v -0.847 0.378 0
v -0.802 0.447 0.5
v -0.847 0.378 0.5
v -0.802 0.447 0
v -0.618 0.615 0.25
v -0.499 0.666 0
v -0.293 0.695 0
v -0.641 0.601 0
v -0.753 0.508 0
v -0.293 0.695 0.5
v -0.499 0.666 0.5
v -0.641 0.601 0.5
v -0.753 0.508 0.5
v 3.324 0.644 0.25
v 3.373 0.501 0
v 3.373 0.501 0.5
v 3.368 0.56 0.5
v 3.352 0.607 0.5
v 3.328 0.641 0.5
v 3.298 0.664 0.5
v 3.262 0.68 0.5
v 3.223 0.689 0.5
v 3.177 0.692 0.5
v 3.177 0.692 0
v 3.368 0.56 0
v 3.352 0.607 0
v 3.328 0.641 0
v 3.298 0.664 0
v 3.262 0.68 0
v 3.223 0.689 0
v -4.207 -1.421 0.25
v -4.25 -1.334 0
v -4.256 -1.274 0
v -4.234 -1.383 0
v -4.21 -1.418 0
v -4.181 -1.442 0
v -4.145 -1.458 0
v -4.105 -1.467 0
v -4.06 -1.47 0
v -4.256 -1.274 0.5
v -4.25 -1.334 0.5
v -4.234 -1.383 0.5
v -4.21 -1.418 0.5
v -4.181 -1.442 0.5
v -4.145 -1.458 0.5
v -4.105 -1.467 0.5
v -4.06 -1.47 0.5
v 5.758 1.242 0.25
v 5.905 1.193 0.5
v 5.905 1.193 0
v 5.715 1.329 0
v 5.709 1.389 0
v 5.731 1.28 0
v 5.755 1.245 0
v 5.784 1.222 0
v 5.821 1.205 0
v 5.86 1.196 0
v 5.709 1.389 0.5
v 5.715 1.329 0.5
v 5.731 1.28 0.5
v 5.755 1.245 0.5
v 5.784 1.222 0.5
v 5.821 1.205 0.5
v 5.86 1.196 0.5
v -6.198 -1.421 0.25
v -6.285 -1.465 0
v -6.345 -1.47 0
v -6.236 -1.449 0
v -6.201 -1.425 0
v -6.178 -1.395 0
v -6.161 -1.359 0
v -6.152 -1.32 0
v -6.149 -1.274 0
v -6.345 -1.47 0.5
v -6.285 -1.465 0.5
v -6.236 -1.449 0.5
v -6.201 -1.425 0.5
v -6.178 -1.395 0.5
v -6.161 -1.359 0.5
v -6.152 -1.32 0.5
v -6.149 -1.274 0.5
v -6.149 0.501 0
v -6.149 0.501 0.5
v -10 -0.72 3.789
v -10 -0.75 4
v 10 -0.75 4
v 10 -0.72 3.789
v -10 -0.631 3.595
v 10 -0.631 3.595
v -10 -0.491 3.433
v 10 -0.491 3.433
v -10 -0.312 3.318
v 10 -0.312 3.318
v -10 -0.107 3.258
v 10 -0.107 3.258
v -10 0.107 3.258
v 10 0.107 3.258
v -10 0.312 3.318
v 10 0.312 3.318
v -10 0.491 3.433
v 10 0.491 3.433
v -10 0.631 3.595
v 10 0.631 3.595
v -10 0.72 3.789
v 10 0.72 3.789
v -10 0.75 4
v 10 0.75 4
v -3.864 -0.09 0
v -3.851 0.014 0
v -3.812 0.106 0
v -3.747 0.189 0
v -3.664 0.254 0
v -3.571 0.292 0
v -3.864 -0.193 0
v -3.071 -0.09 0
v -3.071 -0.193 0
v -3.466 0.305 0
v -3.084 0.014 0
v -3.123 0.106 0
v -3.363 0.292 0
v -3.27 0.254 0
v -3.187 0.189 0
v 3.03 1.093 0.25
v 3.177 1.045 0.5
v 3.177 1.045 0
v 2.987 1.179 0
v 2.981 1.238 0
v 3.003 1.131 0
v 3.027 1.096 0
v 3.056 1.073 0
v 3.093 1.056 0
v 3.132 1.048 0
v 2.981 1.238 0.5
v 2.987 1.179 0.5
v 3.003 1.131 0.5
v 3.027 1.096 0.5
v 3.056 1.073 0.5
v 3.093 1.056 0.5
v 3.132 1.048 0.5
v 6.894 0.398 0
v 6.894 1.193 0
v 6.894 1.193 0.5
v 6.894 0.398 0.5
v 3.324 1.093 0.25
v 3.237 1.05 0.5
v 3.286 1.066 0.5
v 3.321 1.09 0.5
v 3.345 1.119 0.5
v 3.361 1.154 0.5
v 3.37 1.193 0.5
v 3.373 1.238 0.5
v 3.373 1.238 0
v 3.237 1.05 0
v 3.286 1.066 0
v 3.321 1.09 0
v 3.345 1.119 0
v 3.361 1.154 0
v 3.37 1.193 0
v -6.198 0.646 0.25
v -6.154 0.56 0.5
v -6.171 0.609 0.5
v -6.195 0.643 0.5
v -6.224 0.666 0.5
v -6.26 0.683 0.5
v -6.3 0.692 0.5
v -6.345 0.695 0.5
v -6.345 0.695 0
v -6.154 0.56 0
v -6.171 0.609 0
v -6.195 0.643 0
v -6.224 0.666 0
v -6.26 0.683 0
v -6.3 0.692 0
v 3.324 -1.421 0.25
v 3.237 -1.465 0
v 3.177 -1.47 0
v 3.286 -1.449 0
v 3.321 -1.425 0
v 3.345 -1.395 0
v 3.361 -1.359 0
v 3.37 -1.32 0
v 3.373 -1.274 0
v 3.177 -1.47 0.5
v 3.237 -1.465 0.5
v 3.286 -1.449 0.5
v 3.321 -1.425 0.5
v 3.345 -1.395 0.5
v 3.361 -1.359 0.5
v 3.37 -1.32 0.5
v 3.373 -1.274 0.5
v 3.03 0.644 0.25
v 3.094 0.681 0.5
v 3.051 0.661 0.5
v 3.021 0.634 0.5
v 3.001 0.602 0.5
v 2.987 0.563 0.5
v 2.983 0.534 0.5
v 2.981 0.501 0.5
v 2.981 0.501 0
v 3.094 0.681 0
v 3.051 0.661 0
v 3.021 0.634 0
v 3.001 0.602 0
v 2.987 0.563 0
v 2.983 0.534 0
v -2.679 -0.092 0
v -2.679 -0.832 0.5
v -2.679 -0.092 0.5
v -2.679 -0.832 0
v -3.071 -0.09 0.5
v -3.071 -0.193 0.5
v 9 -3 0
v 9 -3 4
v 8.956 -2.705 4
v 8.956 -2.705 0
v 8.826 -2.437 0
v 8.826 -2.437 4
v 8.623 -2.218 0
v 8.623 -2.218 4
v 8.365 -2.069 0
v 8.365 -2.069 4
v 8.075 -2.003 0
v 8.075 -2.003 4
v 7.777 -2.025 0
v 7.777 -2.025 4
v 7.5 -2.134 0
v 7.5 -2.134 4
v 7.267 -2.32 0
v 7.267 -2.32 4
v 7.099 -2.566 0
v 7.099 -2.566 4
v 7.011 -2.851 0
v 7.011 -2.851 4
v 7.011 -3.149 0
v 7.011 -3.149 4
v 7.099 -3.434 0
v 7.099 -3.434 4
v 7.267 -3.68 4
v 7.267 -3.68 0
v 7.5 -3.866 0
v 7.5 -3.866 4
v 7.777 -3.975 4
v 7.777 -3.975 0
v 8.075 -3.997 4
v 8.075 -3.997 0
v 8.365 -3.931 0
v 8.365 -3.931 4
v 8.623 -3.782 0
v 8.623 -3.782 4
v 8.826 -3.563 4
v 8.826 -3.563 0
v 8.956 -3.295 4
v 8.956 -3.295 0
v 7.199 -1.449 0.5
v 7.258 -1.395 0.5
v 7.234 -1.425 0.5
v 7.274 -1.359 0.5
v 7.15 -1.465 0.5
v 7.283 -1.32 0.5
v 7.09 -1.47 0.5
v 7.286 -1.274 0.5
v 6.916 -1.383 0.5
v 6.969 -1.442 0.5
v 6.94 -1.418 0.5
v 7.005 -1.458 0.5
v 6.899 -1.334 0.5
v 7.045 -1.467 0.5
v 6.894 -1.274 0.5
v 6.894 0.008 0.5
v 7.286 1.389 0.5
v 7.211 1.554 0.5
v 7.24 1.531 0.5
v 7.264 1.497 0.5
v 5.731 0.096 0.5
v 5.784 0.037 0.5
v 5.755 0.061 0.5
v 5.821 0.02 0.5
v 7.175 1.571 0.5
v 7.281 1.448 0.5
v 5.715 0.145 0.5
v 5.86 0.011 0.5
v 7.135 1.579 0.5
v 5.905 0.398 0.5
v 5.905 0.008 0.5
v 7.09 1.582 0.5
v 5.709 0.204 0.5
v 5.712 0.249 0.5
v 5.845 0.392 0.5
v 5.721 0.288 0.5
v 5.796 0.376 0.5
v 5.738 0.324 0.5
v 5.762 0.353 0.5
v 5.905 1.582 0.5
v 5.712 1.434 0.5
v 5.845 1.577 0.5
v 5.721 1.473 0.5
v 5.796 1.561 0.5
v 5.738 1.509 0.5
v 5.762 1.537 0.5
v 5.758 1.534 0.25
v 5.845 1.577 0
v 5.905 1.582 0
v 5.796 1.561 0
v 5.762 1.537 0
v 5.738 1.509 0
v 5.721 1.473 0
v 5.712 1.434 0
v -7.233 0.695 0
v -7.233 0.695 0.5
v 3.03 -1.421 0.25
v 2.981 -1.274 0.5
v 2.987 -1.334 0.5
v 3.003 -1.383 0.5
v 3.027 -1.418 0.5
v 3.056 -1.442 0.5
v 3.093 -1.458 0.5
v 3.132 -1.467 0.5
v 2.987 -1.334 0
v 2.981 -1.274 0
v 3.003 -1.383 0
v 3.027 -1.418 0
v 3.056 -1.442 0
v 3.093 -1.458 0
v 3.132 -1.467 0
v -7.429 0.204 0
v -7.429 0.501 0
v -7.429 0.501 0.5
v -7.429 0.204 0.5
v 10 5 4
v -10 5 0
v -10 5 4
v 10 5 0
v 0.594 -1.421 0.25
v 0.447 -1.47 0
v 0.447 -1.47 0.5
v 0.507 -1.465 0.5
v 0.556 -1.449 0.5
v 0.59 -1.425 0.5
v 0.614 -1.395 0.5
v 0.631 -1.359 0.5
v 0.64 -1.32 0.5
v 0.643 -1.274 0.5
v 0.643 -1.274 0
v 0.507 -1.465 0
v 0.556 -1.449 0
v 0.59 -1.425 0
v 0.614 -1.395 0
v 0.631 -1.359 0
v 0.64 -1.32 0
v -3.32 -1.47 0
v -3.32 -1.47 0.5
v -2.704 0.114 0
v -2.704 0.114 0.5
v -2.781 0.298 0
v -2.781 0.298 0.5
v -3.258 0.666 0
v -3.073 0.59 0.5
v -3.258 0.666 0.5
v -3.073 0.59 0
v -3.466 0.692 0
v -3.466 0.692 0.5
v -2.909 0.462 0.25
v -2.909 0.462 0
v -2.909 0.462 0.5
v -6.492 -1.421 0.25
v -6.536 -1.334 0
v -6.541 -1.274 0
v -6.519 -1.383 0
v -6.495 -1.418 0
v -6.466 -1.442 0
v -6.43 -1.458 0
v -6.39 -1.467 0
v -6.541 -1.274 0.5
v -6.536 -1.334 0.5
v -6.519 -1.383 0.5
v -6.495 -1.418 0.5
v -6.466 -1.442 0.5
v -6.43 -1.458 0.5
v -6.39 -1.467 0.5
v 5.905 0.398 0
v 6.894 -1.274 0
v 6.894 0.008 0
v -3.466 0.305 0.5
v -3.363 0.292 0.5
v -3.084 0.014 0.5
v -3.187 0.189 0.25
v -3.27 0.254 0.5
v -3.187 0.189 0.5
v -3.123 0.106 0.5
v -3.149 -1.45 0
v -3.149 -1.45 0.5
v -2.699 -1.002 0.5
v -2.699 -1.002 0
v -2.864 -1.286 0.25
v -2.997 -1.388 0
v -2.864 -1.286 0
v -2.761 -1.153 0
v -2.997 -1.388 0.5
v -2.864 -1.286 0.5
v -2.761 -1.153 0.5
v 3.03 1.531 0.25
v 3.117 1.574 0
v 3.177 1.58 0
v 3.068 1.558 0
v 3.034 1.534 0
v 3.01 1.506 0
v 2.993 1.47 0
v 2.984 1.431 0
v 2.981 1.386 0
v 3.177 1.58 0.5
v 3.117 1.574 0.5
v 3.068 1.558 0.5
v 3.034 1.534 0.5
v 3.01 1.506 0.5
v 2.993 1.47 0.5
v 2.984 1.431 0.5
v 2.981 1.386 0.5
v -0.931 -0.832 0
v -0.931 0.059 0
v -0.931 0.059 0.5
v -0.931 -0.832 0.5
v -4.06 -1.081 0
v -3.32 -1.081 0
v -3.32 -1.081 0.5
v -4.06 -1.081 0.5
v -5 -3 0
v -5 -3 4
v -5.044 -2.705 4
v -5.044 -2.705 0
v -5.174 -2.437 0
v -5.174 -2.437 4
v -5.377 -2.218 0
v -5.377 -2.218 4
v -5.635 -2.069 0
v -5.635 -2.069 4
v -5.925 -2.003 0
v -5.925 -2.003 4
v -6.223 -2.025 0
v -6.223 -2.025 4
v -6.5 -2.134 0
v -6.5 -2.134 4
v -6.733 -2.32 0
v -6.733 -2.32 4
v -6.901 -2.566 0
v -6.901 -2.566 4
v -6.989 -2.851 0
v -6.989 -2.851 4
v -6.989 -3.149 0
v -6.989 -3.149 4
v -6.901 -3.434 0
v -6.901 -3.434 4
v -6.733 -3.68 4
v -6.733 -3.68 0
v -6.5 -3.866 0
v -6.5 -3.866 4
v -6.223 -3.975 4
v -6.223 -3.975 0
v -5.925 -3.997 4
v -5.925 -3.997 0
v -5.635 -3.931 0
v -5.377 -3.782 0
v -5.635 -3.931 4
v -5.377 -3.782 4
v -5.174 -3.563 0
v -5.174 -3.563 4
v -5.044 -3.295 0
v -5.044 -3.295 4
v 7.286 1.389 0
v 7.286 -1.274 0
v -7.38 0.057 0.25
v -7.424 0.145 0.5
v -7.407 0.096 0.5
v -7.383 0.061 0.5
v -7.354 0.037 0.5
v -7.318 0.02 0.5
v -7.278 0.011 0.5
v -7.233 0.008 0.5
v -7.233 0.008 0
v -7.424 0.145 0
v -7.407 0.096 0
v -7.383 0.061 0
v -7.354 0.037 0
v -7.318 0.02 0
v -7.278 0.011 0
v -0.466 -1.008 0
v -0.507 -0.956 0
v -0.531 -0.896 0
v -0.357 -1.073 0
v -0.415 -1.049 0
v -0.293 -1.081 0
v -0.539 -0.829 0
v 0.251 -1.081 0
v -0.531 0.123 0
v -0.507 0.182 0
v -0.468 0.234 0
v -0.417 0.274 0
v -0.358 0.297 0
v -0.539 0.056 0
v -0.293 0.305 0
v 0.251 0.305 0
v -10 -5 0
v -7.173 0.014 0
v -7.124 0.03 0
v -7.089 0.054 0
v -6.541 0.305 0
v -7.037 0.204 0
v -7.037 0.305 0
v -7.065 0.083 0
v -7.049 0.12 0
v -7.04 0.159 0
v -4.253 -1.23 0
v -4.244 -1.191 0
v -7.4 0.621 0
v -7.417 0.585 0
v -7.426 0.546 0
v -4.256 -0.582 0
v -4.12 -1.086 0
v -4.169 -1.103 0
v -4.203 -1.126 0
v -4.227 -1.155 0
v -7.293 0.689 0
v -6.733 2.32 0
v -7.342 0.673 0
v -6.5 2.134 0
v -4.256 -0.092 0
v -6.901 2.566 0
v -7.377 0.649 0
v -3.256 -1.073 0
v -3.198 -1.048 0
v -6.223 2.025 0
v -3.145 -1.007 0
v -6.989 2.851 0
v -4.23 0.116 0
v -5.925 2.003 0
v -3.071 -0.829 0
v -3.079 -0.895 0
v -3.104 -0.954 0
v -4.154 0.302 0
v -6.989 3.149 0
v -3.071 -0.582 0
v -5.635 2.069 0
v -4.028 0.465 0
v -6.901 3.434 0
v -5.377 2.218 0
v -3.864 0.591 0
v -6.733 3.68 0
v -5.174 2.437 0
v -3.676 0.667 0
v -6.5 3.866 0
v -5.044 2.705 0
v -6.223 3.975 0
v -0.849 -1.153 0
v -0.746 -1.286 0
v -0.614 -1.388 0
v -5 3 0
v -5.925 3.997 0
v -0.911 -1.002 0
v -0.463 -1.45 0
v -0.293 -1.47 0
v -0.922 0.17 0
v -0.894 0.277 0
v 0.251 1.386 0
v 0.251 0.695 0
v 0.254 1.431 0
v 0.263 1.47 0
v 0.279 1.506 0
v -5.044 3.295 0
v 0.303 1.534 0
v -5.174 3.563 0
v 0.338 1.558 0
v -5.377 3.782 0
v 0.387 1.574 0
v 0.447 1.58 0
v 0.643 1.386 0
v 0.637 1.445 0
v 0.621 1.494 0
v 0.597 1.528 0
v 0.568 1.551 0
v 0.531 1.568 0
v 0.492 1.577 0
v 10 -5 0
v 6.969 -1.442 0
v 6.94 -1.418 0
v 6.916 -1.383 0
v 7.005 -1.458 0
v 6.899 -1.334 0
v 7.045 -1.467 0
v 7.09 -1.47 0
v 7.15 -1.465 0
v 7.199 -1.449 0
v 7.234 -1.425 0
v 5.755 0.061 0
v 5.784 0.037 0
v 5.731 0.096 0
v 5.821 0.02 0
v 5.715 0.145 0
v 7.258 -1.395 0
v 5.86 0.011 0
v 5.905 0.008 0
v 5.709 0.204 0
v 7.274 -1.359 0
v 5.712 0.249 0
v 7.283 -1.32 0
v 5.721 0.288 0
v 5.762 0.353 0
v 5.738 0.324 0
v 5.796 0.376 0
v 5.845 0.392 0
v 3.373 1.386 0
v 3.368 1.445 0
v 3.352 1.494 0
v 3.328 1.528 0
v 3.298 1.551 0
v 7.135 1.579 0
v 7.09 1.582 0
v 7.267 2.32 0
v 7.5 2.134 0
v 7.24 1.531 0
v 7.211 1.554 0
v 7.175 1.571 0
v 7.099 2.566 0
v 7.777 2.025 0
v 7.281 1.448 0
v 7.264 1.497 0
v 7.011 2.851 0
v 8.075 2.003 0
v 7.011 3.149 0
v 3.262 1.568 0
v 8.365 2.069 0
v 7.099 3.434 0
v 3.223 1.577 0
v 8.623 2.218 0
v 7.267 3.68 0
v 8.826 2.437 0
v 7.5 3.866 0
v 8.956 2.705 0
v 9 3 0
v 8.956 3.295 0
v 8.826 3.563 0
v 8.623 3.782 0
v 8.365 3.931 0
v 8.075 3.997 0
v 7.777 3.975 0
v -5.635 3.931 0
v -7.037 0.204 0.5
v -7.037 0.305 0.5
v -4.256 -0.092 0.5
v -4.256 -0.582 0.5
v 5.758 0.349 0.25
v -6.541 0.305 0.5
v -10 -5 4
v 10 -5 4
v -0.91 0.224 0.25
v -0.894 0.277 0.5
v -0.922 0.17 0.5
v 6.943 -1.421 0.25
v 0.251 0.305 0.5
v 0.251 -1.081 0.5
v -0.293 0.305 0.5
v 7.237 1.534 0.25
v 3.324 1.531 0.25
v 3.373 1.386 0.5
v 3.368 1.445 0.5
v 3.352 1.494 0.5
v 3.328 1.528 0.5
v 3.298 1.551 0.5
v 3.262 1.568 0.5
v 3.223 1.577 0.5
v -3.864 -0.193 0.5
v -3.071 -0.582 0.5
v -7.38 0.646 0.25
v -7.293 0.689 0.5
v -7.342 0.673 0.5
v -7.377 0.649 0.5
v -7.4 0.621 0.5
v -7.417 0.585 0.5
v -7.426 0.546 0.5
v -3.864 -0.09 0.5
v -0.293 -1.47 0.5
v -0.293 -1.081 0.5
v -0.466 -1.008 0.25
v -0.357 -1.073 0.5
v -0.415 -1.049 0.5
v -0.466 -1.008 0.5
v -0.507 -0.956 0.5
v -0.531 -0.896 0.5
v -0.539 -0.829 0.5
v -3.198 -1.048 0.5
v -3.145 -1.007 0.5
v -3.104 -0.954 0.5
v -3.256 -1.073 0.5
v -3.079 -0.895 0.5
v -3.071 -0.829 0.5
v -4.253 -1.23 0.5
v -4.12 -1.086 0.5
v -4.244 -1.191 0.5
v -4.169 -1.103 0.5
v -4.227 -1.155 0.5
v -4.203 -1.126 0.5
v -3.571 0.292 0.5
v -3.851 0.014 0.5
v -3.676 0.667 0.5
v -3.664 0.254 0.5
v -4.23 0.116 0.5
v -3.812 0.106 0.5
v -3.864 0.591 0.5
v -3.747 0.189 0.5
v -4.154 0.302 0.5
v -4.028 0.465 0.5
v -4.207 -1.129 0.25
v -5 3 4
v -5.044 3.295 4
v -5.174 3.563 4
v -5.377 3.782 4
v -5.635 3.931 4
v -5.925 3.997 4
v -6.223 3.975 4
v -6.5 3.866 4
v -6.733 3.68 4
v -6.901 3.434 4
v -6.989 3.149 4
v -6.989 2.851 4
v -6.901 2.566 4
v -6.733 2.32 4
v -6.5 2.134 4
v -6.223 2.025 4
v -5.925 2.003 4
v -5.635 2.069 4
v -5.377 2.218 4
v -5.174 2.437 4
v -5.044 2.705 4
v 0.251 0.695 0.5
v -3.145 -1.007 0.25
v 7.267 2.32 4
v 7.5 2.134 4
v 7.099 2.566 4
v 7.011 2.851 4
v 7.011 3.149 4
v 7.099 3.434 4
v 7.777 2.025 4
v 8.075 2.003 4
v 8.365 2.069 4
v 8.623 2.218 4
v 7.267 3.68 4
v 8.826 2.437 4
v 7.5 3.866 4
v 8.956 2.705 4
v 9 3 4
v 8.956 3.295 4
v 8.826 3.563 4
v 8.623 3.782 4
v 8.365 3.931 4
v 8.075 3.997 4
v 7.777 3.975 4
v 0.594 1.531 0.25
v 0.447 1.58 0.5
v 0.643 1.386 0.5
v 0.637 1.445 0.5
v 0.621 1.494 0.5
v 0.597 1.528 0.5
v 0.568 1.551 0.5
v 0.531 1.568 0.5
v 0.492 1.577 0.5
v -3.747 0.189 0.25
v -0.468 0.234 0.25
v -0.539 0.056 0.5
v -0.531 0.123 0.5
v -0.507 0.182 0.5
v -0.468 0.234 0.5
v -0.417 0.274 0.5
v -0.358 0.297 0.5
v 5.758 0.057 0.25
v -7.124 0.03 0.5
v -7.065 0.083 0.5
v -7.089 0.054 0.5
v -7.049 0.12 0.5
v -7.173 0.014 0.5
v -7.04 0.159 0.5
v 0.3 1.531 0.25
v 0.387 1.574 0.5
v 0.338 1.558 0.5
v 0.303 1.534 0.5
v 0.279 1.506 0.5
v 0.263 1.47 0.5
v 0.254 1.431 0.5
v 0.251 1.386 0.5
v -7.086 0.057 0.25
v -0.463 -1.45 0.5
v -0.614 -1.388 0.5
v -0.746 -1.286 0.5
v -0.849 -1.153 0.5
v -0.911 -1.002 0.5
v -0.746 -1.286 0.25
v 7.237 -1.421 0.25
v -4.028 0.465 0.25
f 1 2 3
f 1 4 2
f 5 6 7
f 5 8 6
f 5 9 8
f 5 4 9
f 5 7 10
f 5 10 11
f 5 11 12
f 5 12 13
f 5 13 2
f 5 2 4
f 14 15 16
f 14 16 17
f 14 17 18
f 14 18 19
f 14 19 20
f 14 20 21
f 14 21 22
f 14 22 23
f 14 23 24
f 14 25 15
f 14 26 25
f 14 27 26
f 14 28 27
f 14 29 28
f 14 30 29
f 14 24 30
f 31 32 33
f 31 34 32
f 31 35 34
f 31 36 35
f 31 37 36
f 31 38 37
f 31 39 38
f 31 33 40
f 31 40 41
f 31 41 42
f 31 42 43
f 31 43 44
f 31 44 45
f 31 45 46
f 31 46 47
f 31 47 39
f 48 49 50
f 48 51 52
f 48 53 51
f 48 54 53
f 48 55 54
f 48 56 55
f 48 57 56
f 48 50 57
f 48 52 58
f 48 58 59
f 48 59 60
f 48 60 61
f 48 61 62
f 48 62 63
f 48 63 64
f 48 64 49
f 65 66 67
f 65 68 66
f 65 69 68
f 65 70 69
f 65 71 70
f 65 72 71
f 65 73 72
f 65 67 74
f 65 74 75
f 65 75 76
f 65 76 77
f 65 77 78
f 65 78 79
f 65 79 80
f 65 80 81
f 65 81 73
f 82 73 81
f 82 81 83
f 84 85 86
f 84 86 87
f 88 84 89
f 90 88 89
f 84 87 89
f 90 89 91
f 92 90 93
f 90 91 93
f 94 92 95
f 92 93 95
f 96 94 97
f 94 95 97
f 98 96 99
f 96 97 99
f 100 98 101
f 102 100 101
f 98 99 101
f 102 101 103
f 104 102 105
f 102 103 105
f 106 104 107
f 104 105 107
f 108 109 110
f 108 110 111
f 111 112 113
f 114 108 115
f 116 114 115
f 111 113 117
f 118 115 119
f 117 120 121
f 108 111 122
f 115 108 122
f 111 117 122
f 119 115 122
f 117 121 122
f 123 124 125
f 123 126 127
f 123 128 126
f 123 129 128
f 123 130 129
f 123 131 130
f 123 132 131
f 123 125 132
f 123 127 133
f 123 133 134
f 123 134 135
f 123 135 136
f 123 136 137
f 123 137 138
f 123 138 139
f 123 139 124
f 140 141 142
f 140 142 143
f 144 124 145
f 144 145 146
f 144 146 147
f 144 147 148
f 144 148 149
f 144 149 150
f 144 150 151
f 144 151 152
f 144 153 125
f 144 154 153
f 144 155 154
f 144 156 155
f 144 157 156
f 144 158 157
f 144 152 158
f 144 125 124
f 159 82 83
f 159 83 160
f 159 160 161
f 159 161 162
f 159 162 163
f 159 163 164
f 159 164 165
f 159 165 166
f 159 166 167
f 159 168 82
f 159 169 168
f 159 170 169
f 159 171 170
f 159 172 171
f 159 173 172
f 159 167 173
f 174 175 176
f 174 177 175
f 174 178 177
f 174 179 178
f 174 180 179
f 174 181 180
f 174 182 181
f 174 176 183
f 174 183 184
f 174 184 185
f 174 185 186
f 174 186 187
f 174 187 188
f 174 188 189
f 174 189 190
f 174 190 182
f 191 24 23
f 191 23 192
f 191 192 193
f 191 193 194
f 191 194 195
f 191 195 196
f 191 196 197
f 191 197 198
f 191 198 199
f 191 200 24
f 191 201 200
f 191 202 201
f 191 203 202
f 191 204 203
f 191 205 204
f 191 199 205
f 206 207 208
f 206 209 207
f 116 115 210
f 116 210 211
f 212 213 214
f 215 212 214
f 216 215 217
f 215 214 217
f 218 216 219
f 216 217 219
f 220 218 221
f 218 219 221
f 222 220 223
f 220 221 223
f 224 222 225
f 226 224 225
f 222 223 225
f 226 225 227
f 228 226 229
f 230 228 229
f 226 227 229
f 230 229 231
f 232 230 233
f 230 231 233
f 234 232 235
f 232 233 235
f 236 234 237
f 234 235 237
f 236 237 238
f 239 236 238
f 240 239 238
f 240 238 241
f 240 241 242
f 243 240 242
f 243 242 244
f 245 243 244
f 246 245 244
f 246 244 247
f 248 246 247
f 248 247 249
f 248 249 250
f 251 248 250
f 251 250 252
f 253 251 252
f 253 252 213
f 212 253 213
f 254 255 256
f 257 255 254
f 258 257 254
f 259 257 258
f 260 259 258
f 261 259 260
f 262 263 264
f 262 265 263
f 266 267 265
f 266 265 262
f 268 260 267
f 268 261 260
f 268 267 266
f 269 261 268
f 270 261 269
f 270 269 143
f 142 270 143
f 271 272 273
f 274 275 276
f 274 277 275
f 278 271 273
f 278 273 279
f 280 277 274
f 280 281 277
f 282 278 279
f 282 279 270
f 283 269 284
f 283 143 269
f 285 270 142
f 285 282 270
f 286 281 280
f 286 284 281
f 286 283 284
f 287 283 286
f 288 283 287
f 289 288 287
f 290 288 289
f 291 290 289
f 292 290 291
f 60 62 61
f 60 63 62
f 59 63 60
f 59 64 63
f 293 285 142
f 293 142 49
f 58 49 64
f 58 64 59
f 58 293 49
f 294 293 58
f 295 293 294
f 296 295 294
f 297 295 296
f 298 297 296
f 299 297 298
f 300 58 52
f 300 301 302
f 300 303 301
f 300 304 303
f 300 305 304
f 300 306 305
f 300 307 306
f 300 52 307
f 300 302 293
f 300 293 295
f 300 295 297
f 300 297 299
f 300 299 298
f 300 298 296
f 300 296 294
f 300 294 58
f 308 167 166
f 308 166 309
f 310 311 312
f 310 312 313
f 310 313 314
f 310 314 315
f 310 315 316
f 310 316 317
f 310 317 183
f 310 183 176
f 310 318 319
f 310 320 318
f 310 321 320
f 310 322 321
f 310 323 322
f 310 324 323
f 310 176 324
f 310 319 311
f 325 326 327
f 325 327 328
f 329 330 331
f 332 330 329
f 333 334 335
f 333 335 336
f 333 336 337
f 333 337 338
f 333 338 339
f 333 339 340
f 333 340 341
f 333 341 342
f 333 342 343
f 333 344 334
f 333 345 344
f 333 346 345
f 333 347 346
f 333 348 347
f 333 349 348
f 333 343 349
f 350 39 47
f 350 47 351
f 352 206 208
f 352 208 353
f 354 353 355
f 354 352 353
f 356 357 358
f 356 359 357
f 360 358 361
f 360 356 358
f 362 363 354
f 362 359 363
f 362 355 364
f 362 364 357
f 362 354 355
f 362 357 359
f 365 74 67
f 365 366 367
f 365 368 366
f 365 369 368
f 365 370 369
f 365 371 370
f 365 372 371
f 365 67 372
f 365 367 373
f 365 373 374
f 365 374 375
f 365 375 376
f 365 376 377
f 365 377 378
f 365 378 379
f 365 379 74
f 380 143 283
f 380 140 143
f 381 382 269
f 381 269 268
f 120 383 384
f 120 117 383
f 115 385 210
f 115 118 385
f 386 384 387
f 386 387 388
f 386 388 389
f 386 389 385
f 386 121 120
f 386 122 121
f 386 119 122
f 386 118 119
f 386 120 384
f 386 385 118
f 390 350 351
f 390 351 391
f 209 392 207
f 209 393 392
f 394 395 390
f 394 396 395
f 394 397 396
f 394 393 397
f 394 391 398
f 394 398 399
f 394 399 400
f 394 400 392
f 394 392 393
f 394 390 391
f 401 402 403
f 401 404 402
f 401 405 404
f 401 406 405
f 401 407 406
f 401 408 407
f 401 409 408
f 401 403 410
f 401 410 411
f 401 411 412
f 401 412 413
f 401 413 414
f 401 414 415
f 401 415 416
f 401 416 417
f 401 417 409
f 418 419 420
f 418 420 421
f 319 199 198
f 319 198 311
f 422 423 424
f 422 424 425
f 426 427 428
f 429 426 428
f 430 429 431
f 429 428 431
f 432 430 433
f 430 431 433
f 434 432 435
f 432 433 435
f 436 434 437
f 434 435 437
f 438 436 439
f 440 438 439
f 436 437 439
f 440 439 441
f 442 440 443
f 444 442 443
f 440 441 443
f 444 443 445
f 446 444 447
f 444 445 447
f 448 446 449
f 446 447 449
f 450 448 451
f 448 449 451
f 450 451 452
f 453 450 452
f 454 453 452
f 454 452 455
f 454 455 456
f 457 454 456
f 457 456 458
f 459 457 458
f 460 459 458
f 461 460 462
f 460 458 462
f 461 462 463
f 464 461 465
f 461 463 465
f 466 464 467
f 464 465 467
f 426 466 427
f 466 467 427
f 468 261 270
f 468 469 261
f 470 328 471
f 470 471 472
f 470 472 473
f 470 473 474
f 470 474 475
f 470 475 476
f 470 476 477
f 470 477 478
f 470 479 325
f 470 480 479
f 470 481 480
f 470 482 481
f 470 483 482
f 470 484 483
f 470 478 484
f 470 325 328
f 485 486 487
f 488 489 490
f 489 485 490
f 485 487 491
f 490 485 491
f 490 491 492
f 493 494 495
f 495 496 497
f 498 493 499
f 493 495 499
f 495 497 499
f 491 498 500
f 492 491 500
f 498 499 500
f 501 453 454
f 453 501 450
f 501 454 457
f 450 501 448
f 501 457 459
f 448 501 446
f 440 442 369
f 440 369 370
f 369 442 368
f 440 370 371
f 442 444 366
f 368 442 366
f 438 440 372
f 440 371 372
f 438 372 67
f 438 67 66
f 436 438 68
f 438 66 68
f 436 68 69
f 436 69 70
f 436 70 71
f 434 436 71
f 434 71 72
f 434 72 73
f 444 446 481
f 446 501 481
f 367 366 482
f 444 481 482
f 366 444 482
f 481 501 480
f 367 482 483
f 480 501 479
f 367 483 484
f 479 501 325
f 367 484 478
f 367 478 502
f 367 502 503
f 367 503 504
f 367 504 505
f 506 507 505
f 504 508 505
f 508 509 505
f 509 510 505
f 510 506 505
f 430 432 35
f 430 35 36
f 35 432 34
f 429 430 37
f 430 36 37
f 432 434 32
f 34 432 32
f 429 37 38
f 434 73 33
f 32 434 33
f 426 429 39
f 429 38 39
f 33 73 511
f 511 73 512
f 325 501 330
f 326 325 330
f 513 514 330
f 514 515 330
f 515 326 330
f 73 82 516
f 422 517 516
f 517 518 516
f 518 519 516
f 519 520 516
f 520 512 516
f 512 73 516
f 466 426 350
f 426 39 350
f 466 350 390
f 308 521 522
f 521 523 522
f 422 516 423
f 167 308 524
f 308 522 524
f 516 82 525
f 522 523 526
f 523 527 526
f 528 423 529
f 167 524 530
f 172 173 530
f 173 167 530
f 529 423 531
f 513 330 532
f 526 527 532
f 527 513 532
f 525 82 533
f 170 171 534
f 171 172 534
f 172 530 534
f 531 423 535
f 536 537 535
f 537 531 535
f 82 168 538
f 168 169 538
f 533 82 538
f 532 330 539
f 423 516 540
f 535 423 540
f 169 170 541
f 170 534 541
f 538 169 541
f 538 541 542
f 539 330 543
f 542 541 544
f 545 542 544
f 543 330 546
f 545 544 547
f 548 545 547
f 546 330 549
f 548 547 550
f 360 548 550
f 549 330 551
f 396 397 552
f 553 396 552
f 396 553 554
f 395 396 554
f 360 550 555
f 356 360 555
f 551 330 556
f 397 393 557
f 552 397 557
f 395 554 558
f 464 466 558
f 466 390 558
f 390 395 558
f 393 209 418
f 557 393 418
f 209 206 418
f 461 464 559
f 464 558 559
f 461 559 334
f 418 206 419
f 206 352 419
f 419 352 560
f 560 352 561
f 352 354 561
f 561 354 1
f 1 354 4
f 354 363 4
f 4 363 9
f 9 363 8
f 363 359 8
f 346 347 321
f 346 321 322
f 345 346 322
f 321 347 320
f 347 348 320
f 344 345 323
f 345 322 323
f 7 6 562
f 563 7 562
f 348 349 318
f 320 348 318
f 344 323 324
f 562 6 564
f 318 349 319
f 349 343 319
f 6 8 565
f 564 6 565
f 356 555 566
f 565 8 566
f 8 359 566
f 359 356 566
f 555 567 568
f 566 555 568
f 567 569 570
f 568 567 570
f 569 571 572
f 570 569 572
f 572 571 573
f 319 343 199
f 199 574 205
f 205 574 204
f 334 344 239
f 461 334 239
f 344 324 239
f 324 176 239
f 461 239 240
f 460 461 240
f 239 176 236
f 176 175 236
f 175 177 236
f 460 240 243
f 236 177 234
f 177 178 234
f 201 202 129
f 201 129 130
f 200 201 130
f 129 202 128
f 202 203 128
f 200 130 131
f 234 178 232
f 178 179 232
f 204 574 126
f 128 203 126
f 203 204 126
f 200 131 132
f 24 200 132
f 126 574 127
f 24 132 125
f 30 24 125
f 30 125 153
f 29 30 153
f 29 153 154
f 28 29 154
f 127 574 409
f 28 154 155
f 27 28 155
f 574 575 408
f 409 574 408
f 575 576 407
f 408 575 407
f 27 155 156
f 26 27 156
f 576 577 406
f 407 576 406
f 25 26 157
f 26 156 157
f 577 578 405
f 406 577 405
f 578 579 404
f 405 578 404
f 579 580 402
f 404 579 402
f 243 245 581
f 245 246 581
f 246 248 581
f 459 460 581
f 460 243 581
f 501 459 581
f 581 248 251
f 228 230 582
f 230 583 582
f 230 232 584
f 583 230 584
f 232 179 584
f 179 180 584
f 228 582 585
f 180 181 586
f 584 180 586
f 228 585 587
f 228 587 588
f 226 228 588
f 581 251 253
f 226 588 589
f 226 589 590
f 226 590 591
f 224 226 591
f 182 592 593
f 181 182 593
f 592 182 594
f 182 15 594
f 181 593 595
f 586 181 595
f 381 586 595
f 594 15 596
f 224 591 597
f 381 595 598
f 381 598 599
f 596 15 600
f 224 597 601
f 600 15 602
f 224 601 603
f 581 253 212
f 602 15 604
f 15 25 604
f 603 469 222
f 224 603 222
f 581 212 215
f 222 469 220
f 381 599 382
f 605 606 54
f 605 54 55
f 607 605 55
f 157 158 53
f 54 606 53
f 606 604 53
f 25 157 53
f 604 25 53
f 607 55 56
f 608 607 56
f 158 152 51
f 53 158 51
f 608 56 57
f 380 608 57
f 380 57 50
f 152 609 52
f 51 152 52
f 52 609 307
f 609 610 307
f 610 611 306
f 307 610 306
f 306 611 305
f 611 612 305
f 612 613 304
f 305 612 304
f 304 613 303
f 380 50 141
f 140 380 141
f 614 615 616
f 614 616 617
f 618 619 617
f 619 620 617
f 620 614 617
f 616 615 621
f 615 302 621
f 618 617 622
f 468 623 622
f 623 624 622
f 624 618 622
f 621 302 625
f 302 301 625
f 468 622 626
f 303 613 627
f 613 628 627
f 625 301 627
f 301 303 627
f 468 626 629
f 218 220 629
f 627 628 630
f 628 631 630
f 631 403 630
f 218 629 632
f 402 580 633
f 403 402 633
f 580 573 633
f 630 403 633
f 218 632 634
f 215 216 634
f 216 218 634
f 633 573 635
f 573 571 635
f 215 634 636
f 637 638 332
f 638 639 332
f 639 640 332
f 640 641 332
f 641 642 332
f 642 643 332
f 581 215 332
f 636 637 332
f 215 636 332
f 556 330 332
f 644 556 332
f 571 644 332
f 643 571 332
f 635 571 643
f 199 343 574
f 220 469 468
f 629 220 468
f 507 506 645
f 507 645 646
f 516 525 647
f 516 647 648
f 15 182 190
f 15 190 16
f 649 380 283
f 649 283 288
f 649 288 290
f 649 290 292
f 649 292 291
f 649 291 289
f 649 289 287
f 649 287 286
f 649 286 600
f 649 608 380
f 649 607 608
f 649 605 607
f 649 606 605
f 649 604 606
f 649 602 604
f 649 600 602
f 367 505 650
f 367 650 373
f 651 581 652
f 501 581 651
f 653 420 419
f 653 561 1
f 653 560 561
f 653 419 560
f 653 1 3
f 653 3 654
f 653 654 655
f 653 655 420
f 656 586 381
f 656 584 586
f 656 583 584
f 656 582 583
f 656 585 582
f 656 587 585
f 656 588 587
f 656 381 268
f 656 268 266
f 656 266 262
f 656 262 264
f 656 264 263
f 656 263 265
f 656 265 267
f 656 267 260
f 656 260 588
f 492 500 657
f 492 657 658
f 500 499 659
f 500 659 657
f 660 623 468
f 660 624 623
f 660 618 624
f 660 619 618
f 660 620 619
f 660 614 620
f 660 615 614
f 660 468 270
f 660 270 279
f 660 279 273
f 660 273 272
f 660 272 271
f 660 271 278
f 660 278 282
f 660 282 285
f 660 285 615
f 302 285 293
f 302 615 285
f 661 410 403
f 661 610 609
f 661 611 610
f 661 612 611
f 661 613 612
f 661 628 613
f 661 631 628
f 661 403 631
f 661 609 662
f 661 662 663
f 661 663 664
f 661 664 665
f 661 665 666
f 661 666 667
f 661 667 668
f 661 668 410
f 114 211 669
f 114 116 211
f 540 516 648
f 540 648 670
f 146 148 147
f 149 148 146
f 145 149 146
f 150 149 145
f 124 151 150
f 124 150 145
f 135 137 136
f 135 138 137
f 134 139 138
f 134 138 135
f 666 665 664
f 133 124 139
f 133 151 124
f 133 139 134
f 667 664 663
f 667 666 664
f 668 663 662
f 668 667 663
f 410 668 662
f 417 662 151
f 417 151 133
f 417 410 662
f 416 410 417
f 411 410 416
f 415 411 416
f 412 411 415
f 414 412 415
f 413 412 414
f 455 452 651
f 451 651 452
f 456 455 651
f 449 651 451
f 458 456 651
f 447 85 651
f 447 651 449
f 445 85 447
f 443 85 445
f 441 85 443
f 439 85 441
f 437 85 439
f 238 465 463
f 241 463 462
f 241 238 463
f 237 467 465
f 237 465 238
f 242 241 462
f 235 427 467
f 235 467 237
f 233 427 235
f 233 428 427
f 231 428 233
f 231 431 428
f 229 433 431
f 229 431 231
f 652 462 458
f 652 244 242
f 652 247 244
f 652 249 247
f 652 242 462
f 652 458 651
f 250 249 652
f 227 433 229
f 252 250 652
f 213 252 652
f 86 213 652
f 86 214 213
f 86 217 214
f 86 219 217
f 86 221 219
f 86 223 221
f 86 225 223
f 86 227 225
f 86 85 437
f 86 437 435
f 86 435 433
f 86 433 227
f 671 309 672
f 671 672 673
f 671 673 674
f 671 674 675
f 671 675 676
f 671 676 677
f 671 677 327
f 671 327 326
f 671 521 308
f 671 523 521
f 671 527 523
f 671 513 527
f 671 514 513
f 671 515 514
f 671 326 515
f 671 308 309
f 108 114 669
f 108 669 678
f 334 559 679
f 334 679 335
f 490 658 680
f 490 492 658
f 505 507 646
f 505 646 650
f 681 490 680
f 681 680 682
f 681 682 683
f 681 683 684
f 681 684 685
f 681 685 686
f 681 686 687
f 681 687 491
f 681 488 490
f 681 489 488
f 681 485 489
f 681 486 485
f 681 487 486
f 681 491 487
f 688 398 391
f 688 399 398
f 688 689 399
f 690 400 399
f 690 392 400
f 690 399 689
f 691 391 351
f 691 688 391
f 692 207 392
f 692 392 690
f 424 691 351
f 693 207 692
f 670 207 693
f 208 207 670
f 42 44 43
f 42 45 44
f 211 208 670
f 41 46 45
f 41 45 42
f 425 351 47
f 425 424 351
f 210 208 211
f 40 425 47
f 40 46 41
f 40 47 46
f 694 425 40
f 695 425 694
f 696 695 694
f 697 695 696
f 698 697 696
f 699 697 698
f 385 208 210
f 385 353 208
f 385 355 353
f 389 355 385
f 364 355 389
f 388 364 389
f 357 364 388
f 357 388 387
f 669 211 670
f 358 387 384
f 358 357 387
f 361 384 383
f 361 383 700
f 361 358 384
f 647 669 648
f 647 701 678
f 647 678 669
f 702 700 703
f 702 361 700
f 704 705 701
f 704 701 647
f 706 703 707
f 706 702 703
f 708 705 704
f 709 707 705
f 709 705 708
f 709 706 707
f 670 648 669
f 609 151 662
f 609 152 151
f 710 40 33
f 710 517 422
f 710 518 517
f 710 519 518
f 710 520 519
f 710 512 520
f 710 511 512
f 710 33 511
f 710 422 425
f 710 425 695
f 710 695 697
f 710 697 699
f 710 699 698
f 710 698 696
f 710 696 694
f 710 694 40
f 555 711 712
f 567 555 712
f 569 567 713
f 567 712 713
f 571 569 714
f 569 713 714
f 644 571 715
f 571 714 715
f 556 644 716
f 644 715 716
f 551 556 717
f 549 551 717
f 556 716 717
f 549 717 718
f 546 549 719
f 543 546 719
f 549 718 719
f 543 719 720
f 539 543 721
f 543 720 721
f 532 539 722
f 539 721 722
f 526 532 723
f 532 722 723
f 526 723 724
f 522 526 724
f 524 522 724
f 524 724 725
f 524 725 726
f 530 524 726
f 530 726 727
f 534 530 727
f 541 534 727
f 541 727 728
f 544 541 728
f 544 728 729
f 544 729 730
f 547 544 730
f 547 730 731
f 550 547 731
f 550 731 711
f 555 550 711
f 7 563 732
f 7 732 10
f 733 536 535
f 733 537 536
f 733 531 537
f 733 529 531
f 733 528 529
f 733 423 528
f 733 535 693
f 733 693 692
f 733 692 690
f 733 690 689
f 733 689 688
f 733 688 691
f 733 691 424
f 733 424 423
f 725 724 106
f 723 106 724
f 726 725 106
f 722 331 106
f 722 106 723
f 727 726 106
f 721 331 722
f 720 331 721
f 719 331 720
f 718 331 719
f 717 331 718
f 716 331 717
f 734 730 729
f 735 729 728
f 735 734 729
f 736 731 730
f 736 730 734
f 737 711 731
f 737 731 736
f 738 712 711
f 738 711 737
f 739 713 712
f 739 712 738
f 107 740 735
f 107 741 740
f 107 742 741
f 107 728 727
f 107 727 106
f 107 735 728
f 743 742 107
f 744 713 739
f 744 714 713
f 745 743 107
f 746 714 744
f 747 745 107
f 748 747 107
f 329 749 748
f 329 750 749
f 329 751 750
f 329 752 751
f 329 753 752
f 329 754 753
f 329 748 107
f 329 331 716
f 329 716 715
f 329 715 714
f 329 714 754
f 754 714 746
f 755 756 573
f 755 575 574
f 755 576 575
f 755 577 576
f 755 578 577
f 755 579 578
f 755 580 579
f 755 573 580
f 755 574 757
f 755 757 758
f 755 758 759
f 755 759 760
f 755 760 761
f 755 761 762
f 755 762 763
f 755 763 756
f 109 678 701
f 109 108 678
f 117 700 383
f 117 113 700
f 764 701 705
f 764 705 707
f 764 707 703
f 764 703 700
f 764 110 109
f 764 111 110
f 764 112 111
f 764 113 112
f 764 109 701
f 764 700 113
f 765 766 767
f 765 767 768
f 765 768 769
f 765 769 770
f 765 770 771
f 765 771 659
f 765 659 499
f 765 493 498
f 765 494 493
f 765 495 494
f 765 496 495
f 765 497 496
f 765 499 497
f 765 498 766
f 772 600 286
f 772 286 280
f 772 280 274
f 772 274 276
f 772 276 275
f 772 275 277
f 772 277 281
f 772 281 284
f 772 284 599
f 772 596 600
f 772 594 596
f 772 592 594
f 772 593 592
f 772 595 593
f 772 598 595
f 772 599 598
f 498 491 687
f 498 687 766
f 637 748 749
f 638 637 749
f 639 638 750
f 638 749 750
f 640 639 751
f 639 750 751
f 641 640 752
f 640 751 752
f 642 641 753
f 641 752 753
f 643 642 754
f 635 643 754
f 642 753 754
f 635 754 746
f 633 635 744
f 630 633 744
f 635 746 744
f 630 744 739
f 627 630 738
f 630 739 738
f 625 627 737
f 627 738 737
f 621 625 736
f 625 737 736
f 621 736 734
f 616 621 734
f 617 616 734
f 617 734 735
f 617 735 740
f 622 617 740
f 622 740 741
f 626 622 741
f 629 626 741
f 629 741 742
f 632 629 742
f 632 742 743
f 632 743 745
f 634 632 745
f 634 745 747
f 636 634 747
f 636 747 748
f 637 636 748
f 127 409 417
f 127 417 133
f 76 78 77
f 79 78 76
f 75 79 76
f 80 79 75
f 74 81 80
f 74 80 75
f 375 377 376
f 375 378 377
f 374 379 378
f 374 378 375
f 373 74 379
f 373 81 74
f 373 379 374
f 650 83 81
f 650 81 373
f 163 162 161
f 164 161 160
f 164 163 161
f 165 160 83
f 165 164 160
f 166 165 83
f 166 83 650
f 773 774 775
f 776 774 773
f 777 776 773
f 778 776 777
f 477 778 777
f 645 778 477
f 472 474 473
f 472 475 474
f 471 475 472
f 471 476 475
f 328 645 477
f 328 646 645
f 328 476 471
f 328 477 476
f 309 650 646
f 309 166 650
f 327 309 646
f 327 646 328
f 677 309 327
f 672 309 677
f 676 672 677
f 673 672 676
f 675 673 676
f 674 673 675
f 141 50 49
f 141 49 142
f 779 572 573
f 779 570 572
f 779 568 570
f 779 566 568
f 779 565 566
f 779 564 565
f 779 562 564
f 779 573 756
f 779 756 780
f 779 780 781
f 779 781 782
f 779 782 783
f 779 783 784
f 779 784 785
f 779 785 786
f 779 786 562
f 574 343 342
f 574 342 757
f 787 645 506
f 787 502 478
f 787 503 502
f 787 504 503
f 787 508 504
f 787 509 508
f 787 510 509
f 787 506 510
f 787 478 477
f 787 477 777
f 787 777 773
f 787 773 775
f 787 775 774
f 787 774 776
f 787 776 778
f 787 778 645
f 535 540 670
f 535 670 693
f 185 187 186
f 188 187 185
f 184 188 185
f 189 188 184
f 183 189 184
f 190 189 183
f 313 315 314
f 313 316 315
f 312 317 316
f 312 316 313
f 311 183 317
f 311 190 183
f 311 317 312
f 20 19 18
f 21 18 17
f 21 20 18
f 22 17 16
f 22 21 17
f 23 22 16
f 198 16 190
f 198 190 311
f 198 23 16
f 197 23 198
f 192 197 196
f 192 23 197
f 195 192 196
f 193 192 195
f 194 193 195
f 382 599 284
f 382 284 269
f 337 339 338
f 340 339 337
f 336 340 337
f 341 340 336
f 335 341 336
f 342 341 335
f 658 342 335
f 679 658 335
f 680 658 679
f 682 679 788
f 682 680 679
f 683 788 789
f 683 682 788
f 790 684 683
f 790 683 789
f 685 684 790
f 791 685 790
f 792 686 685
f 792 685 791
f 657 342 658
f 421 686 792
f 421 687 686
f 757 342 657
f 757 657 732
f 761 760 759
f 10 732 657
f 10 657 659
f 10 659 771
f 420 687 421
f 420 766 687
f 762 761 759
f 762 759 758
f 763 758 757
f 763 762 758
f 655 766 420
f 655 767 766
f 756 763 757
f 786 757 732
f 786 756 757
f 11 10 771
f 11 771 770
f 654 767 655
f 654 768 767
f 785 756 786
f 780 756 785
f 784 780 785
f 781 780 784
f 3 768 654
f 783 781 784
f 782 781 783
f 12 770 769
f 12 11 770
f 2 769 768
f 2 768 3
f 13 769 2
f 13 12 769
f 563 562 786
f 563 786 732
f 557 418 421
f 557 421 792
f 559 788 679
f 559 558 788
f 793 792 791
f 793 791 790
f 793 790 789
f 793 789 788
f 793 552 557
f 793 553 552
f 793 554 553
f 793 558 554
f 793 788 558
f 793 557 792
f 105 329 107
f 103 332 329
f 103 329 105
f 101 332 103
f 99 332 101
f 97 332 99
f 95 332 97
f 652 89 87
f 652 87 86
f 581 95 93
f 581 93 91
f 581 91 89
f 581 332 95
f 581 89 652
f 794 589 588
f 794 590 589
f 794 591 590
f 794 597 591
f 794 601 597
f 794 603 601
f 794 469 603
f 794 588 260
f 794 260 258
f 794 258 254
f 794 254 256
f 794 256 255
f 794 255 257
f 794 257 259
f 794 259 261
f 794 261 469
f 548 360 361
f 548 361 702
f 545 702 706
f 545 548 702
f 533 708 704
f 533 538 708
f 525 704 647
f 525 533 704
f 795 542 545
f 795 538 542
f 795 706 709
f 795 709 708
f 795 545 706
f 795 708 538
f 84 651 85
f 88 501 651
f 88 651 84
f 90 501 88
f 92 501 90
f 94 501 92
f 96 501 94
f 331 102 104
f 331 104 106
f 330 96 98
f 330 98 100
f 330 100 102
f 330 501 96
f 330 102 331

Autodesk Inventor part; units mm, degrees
ref_plane "YZ Plane" through (0, 0, 0) normal (1, 0, 0) x (0, 1, 0)
ref_plane "XZ Plane" through (0, 0, 0) normal (0, 1, 0) x (-1, 0, 0)
ref_plane "XY Plane" through (0, 0, 0) normal (0, 0, 1) x (1, 0, 0)
sketch "Sketch3" plane through (0, 0, 0) normal (0, 0, 1) x (1, 0, 0)
  line L0 (-10, 5) -> (10, 5)
  line L1 (10, 5) -> (10, -5)
  line L2 (10, -5) -> (-10, -5)
  line L3 (-10, -5) -> (-10, 5)
  line L4 (-10, 5) -> (10, -5) construction
  line L5 (10, 5) -> (-10, -5) construction
  point P0 (0, 0)
  dimension "d5" = 20
  dimension "d6" = 10
extrude "Extrusion2" add sketch "Sketch3" along normal blind 4
sketch "Sketch4" plane through (10, -5, 0) normal (1, 0, 0) x (0, 0, -1)
  circle A0 centre (-4, 5) radius 0.75
  point P0 (0, 5)
  dimension "d10" = 1.5
extrude "Extrusion3" cut sketch "Sketch4" against normal through all
sketch "Sketch5" plane through (0, 0, 4) normal (0, 0, 1) x (1, 0, 0)
  circle A0 centre (8, 3) radius 1
  circle A1 centre (8, -3) radius 1
  circle A2 centre (-6, 3) radius 1
  circle A3 centre (-6, -3) radius 1
  point P0 (0, 0)
  dimension "d17" = 2
  dimension "d16" = 2
  dimension "d15" = 2
  dimension "d14" = 2
extrude "Extrusion4" cut sketch "Sketch5" against normal through all
sketch "Sketch6" plane through (0, 0, 0) normal (0, 0, -1) x (-1, 0, 0)
  line L0 (-8.1739, 1.5824) -> (1.6987, 1.5824) construction
  line L1 (1.6987, 1.5824) -> (1.6987, -1.5298) construction
  line L2 (1.6987, -1.5298) -> (-8.1739, -1.5298) construction
  line L3 (-8.1739, -1.5298) -> (-8.1739, 1.5824) construction
  line L4 (-7.2861, -1.2743) -> (-7.2861, 1.3892)
  spline S0 degree 2 poles (-7.2861, 1.3892) (-7.2861, 1.5824) (-7.09, 1.5824) knots 0 0 0 1 1 1
  line L5 (-7.09, 1.5824) -> (-5.9053, 1.5824)
  spline S1 degree 2 poles (-5.9053, 1.5824) (-5.7093, 1.5824) (-5.7093, 1.3892) knots 0 0 0 1 1 1
  spline S2 degree 2 poles (-5.7093, 1.3892) (-5.7093, 1.1931) (-5.9053, 1.1931) knots 0 0 0 1 1 1
  line L6 (-5.9053, 1.1931) -> (-6.894, 1.1931)
  line L7 (-6.894, 1.1931) -> (-6.894, 0.3977)
  line L8 (-6.894, 0.3977) -> (-5.9053, 0.3977)
  spline S3 degree 2 poles (-5.9053, 0.3977) (-5.7093, 0.3977) (-5.7093, 0.2045) knots 0 0 0 1 1 1
  spline S4 degree 2 poles (-5.7093, 0.2045) (-5.7093, 0.0084) (-5.9053, 0.0084) knots 0 0 0 1 1 1
  line L9 (-5.9053, 0.0084) -> (-6.894, 0.0084)
  line L10 (-6.894, 0.0084) -> (-6.894, -1.2743)
  spline S5 degree 2 poles (-6.894, -1.2743) (-6.894, -1.4704) (-7.09, -1.4704) knots 0 0 0 1 1 1
  spline S6 degree 2 poles (-7.09, -1.4704) (-7.2861, -1.4704) (-7.2861, -1.2743) knots 0 0 0 1 1 1
  spline S7 degree 2 poles (-3.3734, 0.5014) (-3.3734, 0.6918) (-3.1774, 0.6918) knots 0 0 0 1 1 1
  spline S8 degree 2 poles (-3.1774, 0.6918) (-2.9813, 0.6918) (-2.9813, 0.5014) knots 0 0 0 1 1 1
  line L11 (-2.9813, 0.5014) -> (-2.9813, -1.2743)
  spline S9 degree 2 poles (-2.9813, -1.2743) (-2.9813, -1.4704) (-3.1774, -1.4704) knots 0 0 0 1 1 1
  spline S10 degree 2 poles (-3.1774, -1.4704) (-3.3734, -1.4704) (-3.3734, -1.2743) knots 0 0 0 1 1 1
  line L12 (-3.3734, -1.2743) -> (-3.3734, 0.5014)
  line L13 (-3.3734, 1.2379) -> (-3.3734, 1.3864)
  spline S11 degree 2 poles (-3.3734, 1.3864) (-3.3734, 1.5796) (-3.1774, 1.5796) knots 0 0 0 1 1 1
  spline S12 degree 2 poles (-3.1774, 1.5796) (-2.9813, 1.5796) (-2.9813, 1.3864) knots 0 0 0 1 1 1
  line L14 (-2.9813, 1.3864) -> (-2.9813, 1.2379)
  spline S13 degree 2 poles (-2.9813, 1.2379) (-2.9813, 1.0447) (-3.1774, 1.0447) knots 0 0 0 1 1 1
  spline S14 degree 2 poles (-3.1774, 1.0447) (-3.3734, 1.0447) (-3.3734, 1.2379) knots 0 0 0 1 1 1
  line L15 (0.9313, 0.0588) -> (0.9313, -0.8318)
  spline S15 degree 2 poles (0.9313, -0.8318) (0.9313, -1.1007) (0.5616, -1.4704) (0.2927, -1.4704) knots 0 0 0 1 2 2 2
  line L16 (0.2927, -1.4704) -> (-0.4467, -1.4704)
  spline S16 degree 2 poles (-0.4467, -1.4704) (-0.6427, -1.4704) (-0.6427, -1.2743) knots 0 0 0 1 1 1
  line L17 (-0.6427, -1.2743) -> (-0.6427, 1.3864)
  spline S17 degree 2 poles (-0.6427, 1.3864) (-0.6427, 1.5796) (-0.4467, 1.5796) knots 0 0 0 1 1 1
  spline S18 degree 2 poles (-0.4467, 1.5796) (-0.2506, 1.5796) (-0.2506, 1.3864) knots 0 0 0 1 1 1
  line L18 (-0.2506, 1.3864) -> (-0.2506, 0.6946)
  line L19 (-0.2506, 0.6946) -> (0.2927, 0.6946)
  spline S19 degree 2 poles (0.2927, 0.6946) (0.6652, 0.6946) (0.8473, 0.3781) knots 0 0 0 1 1 1
  spline S20 degree 2 poles (0.8473, 0.3781) (0.9313, 0.2297) (0.9313, 0.0588) knots 0 0 0 1 1 1
  line L20 (0.2927, 0.3053) -> (-0.2506, 0.3053)
  line L21 (-0.2506, 0.3053) -> (-0.2506, -1.0811)
  line L22 (-0.2506, -1.0811) -> (0.2927, -1.0811)
  spline S21 degree 2 poles (0.2927, -1.0811) (0.3935, -1.0811) (0.5392, -0.9354) (0.5392, -0.829) knots 0 0 0 1 2 2 2
  line L23 (0.5392, -0.829) -> (0.5392, 0.056)
  spline S22 degree 2 poles (0.5392, 0.056) (0.5392, 0.1625) (0.3963, 0.3053) (0.2927, 0.3053) knots 0 0 0 1 2 2 2
  line L24 (3.071, -0.5825) -> (3.071, -0.829)
  spline S23 degree 2 poles (3.071, -0.829) (3.071, -0.9326) (3.2195, -1.0811) (3.3203, -1.0811) knots 0 0 0 1 2 2 2
  line L25 (3.3203, -1.0811) -> (4.0597, -1.0811)
  spline S24 degree 2 poles (4.0597, -1.0811) (4.2558, -1.0811) (4.2558, -1.2743) knots 0 0 0 1 1 1
  spline S25 degree 2 poles (4.2558, -1.2743) (4.2558, -1.4704) (4.0597, -1.4704) knots 0 0 0 1 1 1
  line L26 (4.0597, -1.4704) -> (3.3203, -1.4704)
  spline S26 degree 2 poles (3.3203, -1.4704) (3.0486, -1.4704) (2.6789, -1.1007) (2.6789, -0.8318) knots 0 0 0 1 2 2 2
  line L27 (2.6789, -0.8318) -> (2.6789, -0.0924)
  spline S27 degree 2 poles (2.6789, -0.0924) (2.6789, 0.2325) (3.1383, 0.6918) (3.4659, 0.6918) knots 0 0 0 1 2 2 2
  spline S28 degree 2 poles (3.4659, 0.6918) (3.7992, 0.6918) (4.2558, 0.2381) (4.2558, -0.0924) knots 0 0 0 1 2 2 2
  line L28 (4.2558, -0.0924) -> (4.2558, -0.5825)
  line L29 (4.2558, -0.5825) -> (3.071, -0.5825)
  spline S29 degree 2 poles (3.4659, 0.3053) (3.3035, 0.3053) (3.071, 0.0728) (3.071, -0.0896) knots 0 0 0 1 2 2 2
  line L30 (3.071, -0.0896) -> (3.071, -0.1932)
  line L31 (3.071, -0.1932) -> (3.8636, -0.1932)
  line L32 (3.8636, -0.1932) -> (3.8636, -0.0896)
  spline S30 degree 2 poles (3.8636, -0.0896) (3.8636, 0.0728) (3.6312, 0.3053) (3.4659, 0.3053) knots 0 0 0 1 2 2 2
  spline S31 degree 2 poles (6.149, 0.5014) (6.149, 0.6946) (6.3451, 0.6946) knots 0 0 0 1 1 1
  line L33 (6.3451, 0.6946) -> (7.2329, 0.6946)
  spline S32 degree 2 poles (7.2329, 0.6946) (7.429, 0.6946) (7.429, 0.5014) knots 0 0 0 1 1 1
  line L34 (7.429, 0.5014) -> (7.429, 0.2045)
  spline S33 degree 2 poles (7.429, 0.2045) (7.429, 0.0084) (7.2329, 0.0084) knots 0 0 0 1 1 1
  spline S34 degree 2 poles (7.2329, 0.0084) (7.0369, 0.0084) (7.0369, 0.2045) knots 0 0 0 1 1 1
  line L35 (7.0369, 0.2045) -> (7.0369, 0.3053)
  line L36 (7.0369, 0.3053) -> (6.5412, 0.3053)
  line L37 (6.5412, 0.3053) -> (6.5412, -1.2743)
  spline S35 degree 2 poles (6.5412, -1.2743) (6.5412, -1.4704) (6.3451, -1.4704) knots 0 0 0 1 1 1
  spline S36 degree 2 poles (6.3451, -1.4704) (6.149, -1.4704) (6.149, -1.2743) knots 0 0 0 1 1 1
  line L38 (6.149, -1.2743) -> (6.149, 0.5014)
  point P0 (0, 0)
extrude "Extrusion5" cut sketch "Sketch6" against normal blind 0.5
properties part number "fiber_top"
